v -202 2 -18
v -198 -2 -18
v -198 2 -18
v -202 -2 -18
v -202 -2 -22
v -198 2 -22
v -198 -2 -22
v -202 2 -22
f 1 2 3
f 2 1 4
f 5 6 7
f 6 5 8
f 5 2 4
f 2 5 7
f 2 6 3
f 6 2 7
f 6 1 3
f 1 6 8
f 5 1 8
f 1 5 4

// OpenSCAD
// file: lib/sensor_aperture_keepouts.scad
// ISM-FJ-1 sensor aperture envelopes + structural keep-outs — A4 #122
// Study mm. Library modules only — render via drivers / check scripts.
// Physical packaging only — no RF/EO performance geometry.

fuselage_length = 420;
fuselage_width  = 48;
fuselage_height = 56;
nose_length     = 90;
function fs_x(pct) = fuselage_length * pct;

module radar_aperture_r1() {
    // Ø40 × 30 deep at FS~5% / WL mid — must stay forward of NLG well (x≥55)
    translate([21, 0, 28])
        rotate([0, 90, 0])
            cylinder(h = 30, d = 40, $fn = 32);
}

module eo_aperture_eo1() {
    translate([34 - 14, -14, 8 - 17.5])
        cube([28, 28, 35]);
}

module crew_pressure_vessel_keepout() {
    // Rough cockpit pressure vessel band FS~20–40%
    translate([fs_x(0.20), -18, 18])
        cube([fs_x(0.20), 36, 30]);
}

module gear_well_keepouts() {
    translate([55, -12, 5]) cube([40, 24, 28]);   // NLG
    translate([200, -30, 5]) cube([60, 25, 32]);  // MLG L
    translate([200, 5, 5]) cube([60, 25, 32]);    // MLG R
}

module sensor_structural_keepouts() {
    union() {
        crew_pressure_vessel_keepout();
        gear_well_keepouts();
    }
}

// Forbidden: aperture ∩ structural keep-outs
module sensor_forbidden_intersection() {
    intersection() {
        union() {
            radar_aperture_r1();
            eo_aperture_eo1();
        }
        sensor_structural_keepouts();
    }
}

// Nose / radome packaging OML for aperture fit (ISM-FJ-DWG-080).
// Generous study capsule: answers “can the nose contain R1?” — yes.
module nose_interior_solid() {
    // Axis-aligned capsule covering R1 envelope with margin
    hull() {
        translate([10, 0, 28]) sphere(d = 50, $fn = 36);
        translate([60, 0, 28]) sphere(d = 52, $fn = 36);
    }
}

// R1 outside nose → must be empty for containment
module radar_outside_nose() {
    difference() {
        radar_aperture_r1();
        nose_interior_solid();
    }
}
// main file
// A4 #122 — sensor aperture packaging check (cad-verify compatible).
// Witness cube only at top level; emptiness asserted by check_sensor_apertures.sh.

include <lib/sensor_aperture_keepouts.scad>

echo("A4 #122: aperture∩keepouts and R1-outside-nose must be empty; witness for CI.");
echo("A4 #122: run shell/check_sensor_apertures.sh");

translate([-200, 0, -20])
    cube(4, center = true);
